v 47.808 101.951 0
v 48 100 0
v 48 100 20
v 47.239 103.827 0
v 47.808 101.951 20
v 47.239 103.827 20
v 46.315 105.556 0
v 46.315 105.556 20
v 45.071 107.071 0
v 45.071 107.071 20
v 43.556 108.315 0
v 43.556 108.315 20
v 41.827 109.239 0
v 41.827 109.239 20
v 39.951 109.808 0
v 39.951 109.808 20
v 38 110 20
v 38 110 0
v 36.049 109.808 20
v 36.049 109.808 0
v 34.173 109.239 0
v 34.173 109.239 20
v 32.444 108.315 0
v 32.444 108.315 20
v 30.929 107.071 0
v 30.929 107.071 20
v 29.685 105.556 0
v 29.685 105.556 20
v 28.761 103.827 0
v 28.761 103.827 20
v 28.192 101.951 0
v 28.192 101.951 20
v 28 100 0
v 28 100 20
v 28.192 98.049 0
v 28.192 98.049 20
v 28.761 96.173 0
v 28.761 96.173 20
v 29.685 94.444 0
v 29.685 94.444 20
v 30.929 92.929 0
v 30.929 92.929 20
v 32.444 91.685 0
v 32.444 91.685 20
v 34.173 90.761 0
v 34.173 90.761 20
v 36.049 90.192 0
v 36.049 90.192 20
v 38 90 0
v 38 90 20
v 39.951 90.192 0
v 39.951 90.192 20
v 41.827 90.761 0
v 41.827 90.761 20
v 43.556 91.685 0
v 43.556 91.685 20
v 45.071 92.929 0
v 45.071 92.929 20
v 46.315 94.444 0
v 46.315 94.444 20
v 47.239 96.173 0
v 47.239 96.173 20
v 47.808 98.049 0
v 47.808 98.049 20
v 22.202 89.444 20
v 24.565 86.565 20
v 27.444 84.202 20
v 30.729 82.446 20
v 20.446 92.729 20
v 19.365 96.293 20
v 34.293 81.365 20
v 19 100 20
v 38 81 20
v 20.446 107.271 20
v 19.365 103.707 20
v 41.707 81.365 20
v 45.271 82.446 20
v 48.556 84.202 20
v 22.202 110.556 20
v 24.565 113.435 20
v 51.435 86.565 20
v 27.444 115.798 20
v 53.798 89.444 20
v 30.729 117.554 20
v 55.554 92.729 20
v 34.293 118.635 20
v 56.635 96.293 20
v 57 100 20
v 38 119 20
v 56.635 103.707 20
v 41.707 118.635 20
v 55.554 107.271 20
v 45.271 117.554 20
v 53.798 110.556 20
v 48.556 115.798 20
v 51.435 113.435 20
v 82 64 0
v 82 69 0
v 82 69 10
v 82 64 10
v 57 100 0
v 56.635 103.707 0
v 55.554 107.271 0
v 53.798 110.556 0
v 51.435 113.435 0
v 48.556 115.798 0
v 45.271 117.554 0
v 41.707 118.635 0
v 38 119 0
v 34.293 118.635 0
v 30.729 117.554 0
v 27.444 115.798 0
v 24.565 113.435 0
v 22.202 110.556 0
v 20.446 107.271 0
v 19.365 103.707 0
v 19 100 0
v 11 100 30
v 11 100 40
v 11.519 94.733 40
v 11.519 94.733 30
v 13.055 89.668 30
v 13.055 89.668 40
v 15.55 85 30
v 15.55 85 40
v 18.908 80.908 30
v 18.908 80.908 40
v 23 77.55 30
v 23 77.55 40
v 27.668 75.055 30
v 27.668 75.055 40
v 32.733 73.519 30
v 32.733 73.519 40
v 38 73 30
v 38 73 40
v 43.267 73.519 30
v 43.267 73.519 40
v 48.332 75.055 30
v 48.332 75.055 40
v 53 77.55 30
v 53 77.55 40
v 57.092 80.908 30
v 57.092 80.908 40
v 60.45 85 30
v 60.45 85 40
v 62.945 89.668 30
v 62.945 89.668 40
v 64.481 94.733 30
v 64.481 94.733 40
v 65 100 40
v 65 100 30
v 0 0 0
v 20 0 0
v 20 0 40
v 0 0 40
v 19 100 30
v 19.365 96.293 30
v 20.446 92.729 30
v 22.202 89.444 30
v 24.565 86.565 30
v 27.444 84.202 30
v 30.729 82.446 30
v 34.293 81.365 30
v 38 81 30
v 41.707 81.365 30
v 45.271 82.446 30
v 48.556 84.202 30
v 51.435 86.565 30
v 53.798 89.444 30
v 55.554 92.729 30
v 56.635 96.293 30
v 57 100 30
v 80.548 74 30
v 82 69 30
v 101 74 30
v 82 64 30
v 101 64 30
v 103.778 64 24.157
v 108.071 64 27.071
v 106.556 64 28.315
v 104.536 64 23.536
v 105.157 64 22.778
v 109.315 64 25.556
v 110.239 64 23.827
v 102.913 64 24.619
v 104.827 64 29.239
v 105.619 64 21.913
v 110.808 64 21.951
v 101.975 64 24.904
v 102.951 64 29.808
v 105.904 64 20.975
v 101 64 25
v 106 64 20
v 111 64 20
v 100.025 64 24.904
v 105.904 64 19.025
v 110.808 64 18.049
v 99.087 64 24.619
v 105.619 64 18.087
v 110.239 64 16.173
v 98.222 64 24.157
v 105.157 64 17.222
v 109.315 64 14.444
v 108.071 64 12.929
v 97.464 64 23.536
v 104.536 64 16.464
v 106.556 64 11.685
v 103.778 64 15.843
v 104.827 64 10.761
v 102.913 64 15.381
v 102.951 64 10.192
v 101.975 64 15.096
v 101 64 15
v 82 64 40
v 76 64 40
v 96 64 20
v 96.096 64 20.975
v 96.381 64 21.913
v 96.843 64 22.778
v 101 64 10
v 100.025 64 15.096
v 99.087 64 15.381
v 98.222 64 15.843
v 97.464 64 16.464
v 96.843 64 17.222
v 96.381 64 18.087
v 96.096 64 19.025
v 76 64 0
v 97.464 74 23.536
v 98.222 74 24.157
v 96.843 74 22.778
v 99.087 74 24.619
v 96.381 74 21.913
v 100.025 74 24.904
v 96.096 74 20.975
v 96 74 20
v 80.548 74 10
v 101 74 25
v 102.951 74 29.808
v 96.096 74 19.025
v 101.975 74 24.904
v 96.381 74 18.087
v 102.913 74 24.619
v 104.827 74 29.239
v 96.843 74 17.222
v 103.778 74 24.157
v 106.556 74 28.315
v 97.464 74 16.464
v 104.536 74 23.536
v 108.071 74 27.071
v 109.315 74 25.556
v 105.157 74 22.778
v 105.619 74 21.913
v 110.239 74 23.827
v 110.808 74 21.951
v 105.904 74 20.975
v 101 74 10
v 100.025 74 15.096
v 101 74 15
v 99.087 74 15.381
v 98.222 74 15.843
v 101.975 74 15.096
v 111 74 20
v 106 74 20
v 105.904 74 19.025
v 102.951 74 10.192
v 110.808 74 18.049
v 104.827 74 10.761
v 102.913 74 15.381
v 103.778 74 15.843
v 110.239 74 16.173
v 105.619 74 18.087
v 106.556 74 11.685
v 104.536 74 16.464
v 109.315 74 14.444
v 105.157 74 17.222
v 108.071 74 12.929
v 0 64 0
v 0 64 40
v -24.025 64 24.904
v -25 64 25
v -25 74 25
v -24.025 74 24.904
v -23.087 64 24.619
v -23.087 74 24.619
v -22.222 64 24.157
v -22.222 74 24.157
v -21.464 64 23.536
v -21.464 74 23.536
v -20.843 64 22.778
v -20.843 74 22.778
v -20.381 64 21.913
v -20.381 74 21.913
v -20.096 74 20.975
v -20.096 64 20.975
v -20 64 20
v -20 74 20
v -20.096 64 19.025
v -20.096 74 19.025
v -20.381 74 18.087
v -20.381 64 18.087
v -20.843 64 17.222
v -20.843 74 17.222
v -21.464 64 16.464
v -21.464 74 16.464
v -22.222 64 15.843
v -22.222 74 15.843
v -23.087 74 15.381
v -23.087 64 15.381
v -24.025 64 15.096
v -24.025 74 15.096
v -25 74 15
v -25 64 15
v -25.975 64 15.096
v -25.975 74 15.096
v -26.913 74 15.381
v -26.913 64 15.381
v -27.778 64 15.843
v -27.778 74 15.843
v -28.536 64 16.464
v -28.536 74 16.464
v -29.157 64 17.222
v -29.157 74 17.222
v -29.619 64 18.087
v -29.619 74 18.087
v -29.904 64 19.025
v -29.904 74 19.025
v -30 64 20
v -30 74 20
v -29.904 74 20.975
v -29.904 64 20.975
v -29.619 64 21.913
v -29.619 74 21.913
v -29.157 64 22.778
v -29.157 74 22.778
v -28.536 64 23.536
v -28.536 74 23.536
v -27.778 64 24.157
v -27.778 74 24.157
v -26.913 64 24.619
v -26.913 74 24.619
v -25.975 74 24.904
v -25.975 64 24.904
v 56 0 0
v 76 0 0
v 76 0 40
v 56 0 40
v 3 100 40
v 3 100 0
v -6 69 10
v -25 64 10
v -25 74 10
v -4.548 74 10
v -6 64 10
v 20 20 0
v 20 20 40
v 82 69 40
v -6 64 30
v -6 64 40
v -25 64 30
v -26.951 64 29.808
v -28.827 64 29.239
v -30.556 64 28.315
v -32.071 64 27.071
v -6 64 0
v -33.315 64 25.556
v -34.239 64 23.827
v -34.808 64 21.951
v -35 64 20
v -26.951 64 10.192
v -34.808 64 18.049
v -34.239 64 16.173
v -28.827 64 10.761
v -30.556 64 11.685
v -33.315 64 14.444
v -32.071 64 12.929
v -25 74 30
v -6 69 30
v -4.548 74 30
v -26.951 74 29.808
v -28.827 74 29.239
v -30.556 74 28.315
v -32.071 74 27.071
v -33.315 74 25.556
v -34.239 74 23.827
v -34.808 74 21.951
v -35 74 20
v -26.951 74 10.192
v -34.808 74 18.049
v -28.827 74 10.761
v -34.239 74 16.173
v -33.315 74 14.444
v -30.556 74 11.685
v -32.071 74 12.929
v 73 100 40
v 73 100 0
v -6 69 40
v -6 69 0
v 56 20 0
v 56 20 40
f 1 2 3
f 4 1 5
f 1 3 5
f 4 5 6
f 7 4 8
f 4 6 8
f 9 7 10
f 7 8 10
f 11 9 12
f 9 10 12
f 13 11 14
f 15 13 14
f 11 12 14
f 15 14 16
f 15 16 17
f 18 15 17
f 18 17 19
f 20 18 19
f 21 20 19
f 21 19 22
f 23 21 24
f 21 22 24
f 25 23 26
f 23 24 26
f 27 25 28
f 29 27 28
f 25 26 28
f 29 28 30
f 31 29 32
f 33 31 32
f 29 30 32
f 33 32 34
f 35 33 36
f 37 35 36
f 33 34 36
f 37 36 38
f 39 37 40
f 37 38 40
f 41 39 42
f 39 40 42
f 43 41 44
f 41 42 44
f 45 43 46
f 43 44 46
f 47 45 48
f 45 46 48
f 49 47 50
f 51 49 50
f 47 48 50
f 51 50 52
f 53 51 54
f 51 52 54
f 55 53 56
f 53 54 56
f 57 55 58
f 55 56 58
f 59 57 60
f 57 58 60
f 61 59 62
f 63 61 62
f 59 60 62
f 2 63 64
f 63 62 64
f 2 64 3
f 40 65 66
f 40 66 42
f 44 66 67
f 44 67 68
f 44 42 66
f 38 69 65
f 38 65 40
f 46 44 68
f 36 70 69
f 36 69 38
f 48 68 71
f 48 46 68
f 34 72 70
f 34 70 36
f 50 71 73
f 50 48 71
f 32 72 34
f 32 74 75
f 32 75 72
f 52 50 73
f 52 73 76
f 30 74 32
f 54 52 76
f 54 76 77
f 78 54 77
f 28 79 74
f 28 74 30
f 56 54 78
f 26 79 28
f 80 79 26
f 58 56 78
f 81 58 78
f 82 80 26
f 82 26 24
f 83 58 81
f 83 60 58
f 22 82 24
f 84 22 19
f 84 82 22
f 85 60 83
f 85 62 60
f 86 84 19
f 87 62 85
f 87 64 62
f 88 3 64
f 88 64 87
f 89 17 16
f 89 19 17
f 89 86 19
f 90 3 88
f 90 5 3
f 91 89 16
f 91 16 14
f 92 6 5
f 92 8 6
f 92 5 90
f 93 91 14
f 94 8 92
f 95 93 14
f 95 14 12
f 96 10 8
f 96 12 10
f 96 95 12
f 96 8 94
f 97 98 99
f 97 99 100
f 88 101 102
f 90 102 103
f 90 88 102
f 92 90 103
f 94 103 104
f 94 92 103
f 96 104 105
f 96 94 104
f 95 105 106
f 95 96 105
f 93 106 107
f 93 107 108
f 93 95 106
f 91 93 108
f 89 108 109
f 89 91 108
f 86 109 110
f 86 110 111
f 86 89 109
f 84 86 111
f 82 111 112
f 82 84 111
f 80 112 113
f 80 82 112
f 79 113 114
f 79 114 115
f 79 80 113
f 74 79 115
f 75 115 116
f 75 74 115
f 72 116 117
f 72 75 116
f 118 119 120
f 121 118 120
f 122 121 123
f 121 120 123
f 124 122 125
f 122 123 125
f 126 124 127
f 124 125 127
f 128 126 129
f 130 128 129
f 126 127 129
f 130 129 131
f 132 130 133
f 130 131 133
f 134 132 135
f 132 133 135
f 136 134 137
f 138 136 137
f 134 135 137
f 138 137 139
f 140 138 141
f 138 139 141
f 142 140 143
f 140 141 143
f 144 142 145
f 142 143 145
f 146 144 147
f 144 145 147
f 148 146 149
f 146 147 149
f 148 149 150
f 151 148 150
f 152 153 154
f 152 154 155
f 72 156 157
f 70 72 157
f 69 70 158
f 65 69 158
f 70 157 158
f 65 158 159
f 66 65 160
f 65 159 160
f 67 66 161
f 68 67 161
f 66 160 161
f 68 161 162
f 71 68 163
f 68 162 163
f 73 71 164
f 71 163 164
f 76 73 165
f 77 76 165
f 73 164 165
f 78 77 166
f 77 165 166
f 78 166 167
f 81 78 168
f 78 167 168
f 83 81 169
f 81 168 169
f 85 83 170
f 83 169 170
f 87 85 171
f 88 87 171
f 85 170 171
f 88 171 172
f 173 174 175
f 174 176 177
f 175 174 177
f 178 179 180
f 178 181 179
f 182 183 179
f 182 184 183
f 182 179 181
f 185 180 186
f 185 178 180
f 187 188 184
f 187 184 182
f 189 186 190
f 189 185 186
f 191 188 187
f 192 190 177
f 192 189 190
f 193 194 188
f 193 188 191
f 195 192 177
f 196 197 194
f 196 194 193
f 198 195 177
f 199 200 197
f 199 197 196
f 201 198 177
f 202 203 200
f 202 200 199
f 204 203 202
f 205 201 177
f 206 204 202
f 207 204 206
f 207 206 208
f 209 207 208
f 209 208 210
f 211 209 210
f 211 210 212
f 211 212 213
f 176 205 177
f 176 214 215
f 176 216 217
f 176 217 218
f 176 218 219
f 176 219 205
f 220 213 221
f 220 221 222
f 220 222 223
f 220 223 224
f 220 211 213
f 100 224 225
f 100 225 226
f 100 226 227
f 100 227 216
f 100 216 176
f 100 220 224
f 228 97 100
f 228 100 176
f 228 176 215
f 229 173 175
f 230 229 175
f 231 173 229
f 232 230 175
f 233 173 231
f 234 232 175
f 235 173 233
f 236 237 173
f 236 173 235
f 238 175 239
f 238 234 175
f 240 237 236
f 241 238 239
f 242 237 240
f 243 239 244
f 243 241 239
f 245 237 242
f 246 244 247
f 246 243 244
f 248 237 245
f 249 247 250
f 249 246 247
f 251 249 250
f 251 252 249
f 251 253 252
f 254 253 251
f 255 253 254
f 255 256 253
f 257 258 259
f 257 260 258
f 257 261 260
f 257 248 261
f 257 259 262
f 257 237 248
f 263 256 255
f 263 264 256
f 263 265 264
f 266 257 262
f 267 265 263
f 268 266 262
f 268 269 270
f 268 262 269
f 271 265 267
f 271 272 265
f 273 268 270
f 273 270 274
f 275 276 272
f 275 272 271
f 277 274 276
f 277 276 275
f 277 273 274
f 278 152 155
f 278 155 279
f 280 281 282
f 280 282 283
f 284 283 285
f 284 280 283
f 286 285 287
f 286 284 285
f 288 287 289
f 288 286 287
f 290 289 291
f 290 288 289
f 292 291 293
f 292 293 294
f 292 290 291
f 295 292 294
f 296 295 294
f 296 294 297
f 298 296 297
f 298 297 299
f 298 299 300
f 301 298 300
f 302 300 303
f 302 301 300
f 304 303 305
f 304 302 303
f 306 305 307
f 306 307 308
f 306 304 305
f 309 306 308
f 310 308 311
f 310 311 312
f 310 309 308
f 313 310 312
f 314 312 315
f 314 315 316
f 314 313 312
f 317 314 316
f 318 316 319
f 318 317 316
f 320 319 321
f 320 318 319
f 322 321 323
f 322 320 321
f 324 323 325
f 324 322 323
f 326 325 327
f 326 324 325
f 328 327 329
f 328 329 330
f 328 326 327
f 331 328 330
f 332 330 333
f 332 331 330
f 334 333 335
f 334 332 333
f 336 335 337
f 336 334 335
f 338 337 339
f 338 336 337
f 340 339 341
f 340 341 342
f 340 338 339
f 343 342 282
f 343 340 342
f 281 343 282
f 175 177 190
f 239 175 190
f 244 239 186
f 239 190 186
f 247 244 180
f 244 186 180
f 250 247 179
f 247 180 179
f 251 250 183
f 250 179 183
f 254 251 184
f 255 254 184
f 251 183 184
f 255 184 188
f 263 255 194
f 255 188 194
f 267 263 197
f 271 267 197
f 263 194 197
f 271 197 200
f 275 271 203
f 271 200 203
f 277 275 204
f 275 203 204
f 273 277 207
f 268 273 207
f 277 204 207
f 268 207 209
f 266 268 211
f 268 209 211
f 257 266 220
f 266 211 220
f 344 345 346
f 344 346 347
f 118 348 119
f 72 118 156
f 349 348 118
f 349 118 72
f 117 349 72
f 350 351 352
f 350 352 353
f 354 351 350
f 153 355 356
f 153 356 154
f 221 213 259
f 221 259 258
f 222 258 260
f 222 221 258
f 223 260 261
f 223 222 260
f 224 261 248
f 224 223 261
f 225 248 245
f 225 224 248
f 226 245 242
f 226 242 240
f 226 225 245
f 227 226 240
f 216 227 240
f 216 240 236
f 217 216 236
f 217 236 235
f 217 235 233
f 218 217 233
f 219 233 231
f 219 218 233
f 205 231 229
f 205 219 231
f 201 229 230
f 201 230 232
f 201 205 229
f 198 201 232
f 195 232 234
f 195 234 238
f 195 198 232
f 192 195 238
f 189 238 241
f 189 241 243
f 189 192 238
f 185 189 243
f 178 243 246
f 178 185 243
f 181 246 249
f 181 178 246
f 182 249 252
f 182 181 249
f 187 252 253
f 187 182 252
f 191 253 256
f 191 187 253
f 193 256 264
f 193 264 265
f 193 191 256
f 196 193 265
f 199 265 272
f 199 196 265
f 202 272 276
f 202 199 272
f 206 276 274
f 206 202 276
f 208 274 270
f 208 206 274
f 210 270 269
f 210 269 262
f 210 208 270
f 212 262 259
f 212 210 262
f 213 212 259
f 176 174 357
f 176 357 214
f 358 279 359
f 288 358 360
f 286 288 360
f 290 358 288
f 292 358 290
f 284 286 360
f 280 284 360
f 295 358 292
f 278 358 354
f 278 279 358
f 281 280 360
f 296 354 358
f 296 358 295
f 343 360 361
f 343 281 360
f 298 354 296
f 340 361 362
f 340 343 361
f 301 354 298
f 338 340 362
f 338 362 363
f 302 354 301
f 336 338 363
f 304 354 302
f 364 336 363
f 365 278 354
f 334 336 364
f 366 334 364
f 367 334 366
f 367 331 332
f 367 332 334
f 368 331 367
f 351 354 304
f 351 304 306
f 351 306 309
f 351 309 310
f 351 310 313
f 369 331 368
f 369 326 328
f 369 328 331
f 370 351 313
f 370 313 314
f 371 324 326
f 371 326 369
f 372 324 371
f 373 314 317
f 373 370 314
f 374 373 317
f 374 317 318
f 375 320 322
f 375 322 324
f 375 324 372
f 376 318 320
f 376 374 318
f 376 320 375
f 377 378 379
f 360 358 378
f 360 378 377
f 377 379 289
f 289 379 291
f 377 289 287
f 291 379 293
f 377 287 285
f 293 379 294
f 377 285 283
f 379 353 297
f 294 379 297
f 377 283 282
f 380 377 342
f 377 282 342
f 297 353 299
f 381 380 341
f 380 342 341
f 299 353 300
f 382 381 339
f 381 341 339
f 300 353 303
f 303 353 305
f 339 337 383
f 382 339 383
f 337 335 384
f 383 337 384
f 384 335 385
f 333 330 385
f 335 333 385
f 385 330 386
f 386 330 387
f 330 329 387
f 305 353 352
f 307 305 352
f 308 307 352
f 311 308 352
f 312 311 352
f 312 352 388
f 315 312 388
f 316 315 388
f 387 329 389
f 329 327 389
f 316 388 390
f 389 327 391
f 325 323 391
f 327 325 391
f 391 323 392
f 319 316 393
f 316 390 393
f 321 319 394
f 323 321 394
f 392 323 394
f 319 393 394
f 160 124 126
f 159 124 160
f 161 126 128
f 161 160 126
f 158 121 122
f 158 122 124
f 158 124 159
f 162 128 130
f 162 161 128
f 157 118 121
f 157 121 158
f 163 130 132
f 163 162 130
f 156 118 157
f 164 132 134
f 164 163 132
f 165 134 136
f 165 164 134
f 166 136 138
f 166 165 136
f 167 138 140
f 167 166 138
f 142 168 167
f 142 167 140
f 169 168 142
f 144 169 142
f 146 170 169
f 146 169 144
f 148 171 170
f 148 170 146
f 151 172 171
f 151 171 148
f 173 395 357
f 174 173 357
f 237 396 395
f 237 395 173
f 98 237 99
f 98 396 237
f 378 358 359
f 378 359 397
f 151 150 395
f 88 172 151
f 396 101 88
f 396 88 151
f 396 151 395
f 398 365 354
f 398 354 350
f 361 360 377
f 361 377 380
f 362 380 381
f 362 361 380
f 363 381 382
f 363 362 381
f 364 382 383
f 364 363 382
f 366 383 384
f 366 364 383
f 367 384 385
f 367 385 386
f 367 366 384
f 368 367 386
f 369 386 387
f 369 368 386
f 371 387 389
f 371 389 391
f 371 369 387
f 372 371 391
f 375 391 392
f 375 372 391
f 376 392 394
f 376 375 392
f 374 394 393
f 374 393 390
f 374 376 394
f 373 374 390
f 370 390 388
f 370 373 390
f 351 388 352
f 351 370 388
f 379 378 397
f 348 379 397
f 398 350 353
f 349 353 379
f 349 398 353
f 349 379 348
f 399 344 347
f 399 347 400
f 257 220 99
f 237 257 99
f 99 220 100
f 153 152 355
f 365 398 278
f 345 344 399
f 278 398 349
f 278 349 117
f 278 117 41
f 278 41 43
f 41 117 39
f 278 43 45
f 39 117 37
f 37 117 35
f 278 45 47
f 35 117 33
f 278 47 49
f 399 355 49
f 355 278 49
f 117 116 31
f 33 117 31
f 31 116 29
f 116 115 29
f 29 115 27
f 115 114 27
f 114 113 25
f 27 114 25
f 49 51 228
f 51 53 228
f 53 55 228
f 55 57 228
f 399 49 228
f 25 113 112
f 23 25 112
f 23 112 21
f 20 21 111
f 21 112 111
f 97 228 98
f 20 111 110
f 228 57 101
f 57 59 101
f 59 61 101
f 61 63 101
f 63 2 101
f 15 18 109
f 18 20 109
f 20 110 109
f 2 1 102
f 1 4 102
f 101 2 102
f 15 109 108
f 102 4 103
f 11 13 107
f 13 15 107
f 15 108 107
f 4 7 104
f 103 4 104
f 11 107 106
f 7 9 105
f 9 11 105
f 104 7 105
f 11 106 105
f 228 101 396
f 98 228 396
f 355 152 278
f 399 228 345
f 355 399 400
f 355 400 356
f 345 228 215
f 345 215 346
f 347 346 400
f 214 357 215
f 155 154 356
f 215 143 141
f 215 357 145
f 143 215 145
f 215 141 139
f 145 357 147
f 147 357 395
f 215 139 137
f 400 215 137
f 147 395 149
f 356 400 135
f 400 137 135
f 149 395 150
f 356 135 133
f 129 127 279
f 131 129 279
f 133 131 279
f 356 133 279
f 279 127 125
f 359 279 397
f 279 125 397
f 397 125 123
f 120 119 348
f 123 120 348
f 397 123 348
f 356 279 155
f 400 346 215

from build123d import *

# Parameters (mm, degrees)
BOSS_EXTRUDE1_DEPTH = 40
SKETCH2_R           = 27
CUT_EXTRUDE3_DEPTH  = 10
SKETCH4_R           = 19
CUT_EXTRUDE4_DEPTH  = 10
SKETCH5_R           = 19
BOSS_EXTRUDE2_DEPTH = 20
SKETCH6_R           = 10
CUT_EXTRUDE6_DEPTH  = 20
BOSS_EXTRUDE4_START = 64
SKETCH7_R           = 5
BOSS_EXTRUDE4_DEPTH = 10


with BuildPart() as part:
    # Sketch1 → Boss-Extrude1 (new body)
    with BuildSketch(Plane.XY):
        Polygon((0, 0), (0, 64), (-6, 64), (-6, 69), (3, 100), (73, 100), (82, 69), (82, 64), (76, 64), (76, 0), (56, 0), (56, 20), (20, 20), (20, 0), align=None)
    extrude(amount=BOSS_EXTRUDE1_DEPTH)

    # Sketch2 → Cut-Extrude3 (cut)
    with BuildSketch(Plane.XY.offset(40)):
        with Locations((38, 100)):
            Circle(SKETCH2_R)
    extrude(amount=-CUT_EXTRUDE3_DEPTH, mode=Mode.SUBTRACT)

    # Sketch4 → Cut-Extrude4 (cut)
    with BuildSketch(Plane.XY.offset(30)):
        with Locations((38, 100)):
            Circle(SKETCH4_R)
    extrude(amount=-CUT_EXTRUDE4_DEPTH, mode=Mode.SUBTRACT)

    # Sketch5 → Boss-Extrude2 (add)
    with BuildSketch(Plane.XY.offset(20)):
        with Locations((38, 100)):
            Circle(SKETCH5_R)
    extrude(amount=-BOSS_EXTRUDE2_DEPTH)

    # Sketch6 → Cut-Extrude6 (cut)
    with BuildSketch(Plane.XY.offset(20)):
        with Locations((38, 100)):
            Circle(SKETCH6_R)
    extrude(amount=-CUT_EXTRUDE6_DEPTH, mode=Mode.SUBTRACT)

    # Sketch7 → Boss-Extrude4 (add)
    # profile 1 of 2: a face of its own
    with BuildSketch(Plane(origin=(0, 0, 0), x_dir=(1, 0, 0), z_dir=(0, 1, 0)).offset(BOSS_EXTRUDE4_START)):
        with BuildLine():
            Line((82, -10), (77.667968987, -10))
            Line((77.667968987, -10), (77.667968987, -30))
            Line((77.667968987, -30), (82, -30))
            Line((82, -30), (101, -30))
            ThreePointArc((101, -30), (111, -20), (101, -10))
            Line((101, -10), (82, -10))
        make_face()
        with Locations(Location((101, -20, 0), (0, 0, 90))):
            Circle(SKETCH7_R, mode=Mode.SUBTRACT)
    # profile 2 of 2: a face of its own
    with BuildSketch(Plane(origin=(0, 0, 0), x_dir=(1, 0, 0), z_dir=(0, 1, 0)).offset(BOSS_EXTRUDE4_START)):
        with BuildLine():
            Line((-6, -10), (-2.389922535, -10))
            Line((-2.389922535, -10), (-2.389922535, -30))
            Line((-2.389922535, -30), (-6, -30))
            Line((-6, -30), (-25, -30))
            ThreePointArc((-25, -30), (-35, -20), (-25, -10))
            Line((-25, -10), (-6, -10))
        make_face()
        with Locations(Location((-25, -20, 0), (0, 0, 270))):
            Circle(SKETCH7_R, mode=Mode.SUBTRACT)
    extrude(amount=BOSS_EXTRUDE4_DEPTH)


solid = part.part
